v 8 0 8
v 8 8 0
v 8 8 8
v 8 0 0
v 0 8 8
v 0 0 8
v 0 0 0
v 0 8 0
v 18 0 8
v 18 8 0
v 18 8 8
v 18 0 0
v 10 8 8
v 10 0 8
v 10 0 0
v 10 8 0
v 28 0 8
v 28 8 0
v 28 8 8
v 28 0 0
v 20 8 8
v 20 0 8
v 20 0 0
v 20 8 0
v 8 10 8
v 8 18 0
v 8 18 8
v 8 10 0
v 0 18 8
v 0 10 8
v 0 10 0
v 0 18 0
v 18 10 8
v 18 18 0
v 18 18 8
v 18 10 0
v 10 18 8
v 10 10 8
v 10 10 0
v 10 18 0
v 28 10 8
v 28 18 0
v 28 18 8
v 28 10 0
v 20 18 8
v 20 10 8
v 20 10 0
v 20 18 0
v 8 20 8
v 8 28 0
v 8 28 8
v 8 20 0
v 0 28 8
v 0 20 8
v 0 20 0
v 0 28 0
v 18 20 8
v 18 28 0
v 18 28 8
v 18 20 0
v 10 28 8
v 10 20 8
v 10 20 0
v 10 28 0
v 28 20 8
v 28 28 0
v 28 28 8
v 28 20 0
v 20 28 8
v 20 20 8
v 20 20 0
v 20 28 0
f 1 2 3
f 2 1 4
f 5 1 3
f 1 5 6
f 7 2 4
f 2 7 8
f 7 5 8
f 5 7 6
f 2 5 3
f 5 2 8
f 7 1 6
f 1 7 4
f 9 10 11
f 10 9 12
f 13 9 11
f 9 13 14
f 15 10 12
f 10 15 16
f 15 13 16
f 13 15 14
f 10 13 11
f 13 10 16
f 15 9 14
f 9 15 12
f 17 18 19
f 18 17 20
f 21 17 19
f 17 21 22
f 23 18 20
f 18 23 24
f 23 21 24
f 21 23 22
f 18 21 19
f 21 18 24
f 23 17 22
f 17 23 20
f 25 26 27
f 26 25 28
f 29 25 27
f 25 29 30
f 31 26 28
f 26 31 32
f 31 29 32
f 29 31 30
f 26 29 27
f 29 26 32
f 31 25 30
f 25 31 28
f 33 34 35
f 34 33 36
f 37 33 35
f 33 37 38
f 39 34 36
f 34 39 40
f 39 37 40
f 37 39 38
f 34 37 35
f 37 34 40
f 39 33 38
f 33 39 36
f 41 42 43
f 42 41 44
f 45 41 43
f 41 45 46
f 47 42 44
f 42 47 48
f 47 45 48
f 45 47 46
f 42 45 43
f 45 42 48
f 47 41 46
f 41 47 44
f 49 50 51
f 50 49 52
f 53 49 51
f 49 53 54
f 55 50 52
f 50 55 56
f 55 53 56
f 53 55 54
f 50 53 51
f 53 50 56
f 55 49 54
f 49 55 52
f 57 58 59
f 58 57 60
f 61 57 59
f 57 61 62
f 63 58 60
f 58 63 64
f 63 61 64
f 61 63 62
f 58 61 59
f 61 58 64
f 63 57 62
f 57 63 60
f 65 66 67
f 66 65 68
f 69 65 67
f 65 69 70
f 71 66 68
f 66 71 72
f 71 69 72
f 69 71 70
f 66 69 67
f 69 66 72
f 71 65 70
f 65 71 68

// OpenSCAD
for (j=[0:2]) for (i=[0:2]) translate([i*10,j*10,0]) cube(8);
